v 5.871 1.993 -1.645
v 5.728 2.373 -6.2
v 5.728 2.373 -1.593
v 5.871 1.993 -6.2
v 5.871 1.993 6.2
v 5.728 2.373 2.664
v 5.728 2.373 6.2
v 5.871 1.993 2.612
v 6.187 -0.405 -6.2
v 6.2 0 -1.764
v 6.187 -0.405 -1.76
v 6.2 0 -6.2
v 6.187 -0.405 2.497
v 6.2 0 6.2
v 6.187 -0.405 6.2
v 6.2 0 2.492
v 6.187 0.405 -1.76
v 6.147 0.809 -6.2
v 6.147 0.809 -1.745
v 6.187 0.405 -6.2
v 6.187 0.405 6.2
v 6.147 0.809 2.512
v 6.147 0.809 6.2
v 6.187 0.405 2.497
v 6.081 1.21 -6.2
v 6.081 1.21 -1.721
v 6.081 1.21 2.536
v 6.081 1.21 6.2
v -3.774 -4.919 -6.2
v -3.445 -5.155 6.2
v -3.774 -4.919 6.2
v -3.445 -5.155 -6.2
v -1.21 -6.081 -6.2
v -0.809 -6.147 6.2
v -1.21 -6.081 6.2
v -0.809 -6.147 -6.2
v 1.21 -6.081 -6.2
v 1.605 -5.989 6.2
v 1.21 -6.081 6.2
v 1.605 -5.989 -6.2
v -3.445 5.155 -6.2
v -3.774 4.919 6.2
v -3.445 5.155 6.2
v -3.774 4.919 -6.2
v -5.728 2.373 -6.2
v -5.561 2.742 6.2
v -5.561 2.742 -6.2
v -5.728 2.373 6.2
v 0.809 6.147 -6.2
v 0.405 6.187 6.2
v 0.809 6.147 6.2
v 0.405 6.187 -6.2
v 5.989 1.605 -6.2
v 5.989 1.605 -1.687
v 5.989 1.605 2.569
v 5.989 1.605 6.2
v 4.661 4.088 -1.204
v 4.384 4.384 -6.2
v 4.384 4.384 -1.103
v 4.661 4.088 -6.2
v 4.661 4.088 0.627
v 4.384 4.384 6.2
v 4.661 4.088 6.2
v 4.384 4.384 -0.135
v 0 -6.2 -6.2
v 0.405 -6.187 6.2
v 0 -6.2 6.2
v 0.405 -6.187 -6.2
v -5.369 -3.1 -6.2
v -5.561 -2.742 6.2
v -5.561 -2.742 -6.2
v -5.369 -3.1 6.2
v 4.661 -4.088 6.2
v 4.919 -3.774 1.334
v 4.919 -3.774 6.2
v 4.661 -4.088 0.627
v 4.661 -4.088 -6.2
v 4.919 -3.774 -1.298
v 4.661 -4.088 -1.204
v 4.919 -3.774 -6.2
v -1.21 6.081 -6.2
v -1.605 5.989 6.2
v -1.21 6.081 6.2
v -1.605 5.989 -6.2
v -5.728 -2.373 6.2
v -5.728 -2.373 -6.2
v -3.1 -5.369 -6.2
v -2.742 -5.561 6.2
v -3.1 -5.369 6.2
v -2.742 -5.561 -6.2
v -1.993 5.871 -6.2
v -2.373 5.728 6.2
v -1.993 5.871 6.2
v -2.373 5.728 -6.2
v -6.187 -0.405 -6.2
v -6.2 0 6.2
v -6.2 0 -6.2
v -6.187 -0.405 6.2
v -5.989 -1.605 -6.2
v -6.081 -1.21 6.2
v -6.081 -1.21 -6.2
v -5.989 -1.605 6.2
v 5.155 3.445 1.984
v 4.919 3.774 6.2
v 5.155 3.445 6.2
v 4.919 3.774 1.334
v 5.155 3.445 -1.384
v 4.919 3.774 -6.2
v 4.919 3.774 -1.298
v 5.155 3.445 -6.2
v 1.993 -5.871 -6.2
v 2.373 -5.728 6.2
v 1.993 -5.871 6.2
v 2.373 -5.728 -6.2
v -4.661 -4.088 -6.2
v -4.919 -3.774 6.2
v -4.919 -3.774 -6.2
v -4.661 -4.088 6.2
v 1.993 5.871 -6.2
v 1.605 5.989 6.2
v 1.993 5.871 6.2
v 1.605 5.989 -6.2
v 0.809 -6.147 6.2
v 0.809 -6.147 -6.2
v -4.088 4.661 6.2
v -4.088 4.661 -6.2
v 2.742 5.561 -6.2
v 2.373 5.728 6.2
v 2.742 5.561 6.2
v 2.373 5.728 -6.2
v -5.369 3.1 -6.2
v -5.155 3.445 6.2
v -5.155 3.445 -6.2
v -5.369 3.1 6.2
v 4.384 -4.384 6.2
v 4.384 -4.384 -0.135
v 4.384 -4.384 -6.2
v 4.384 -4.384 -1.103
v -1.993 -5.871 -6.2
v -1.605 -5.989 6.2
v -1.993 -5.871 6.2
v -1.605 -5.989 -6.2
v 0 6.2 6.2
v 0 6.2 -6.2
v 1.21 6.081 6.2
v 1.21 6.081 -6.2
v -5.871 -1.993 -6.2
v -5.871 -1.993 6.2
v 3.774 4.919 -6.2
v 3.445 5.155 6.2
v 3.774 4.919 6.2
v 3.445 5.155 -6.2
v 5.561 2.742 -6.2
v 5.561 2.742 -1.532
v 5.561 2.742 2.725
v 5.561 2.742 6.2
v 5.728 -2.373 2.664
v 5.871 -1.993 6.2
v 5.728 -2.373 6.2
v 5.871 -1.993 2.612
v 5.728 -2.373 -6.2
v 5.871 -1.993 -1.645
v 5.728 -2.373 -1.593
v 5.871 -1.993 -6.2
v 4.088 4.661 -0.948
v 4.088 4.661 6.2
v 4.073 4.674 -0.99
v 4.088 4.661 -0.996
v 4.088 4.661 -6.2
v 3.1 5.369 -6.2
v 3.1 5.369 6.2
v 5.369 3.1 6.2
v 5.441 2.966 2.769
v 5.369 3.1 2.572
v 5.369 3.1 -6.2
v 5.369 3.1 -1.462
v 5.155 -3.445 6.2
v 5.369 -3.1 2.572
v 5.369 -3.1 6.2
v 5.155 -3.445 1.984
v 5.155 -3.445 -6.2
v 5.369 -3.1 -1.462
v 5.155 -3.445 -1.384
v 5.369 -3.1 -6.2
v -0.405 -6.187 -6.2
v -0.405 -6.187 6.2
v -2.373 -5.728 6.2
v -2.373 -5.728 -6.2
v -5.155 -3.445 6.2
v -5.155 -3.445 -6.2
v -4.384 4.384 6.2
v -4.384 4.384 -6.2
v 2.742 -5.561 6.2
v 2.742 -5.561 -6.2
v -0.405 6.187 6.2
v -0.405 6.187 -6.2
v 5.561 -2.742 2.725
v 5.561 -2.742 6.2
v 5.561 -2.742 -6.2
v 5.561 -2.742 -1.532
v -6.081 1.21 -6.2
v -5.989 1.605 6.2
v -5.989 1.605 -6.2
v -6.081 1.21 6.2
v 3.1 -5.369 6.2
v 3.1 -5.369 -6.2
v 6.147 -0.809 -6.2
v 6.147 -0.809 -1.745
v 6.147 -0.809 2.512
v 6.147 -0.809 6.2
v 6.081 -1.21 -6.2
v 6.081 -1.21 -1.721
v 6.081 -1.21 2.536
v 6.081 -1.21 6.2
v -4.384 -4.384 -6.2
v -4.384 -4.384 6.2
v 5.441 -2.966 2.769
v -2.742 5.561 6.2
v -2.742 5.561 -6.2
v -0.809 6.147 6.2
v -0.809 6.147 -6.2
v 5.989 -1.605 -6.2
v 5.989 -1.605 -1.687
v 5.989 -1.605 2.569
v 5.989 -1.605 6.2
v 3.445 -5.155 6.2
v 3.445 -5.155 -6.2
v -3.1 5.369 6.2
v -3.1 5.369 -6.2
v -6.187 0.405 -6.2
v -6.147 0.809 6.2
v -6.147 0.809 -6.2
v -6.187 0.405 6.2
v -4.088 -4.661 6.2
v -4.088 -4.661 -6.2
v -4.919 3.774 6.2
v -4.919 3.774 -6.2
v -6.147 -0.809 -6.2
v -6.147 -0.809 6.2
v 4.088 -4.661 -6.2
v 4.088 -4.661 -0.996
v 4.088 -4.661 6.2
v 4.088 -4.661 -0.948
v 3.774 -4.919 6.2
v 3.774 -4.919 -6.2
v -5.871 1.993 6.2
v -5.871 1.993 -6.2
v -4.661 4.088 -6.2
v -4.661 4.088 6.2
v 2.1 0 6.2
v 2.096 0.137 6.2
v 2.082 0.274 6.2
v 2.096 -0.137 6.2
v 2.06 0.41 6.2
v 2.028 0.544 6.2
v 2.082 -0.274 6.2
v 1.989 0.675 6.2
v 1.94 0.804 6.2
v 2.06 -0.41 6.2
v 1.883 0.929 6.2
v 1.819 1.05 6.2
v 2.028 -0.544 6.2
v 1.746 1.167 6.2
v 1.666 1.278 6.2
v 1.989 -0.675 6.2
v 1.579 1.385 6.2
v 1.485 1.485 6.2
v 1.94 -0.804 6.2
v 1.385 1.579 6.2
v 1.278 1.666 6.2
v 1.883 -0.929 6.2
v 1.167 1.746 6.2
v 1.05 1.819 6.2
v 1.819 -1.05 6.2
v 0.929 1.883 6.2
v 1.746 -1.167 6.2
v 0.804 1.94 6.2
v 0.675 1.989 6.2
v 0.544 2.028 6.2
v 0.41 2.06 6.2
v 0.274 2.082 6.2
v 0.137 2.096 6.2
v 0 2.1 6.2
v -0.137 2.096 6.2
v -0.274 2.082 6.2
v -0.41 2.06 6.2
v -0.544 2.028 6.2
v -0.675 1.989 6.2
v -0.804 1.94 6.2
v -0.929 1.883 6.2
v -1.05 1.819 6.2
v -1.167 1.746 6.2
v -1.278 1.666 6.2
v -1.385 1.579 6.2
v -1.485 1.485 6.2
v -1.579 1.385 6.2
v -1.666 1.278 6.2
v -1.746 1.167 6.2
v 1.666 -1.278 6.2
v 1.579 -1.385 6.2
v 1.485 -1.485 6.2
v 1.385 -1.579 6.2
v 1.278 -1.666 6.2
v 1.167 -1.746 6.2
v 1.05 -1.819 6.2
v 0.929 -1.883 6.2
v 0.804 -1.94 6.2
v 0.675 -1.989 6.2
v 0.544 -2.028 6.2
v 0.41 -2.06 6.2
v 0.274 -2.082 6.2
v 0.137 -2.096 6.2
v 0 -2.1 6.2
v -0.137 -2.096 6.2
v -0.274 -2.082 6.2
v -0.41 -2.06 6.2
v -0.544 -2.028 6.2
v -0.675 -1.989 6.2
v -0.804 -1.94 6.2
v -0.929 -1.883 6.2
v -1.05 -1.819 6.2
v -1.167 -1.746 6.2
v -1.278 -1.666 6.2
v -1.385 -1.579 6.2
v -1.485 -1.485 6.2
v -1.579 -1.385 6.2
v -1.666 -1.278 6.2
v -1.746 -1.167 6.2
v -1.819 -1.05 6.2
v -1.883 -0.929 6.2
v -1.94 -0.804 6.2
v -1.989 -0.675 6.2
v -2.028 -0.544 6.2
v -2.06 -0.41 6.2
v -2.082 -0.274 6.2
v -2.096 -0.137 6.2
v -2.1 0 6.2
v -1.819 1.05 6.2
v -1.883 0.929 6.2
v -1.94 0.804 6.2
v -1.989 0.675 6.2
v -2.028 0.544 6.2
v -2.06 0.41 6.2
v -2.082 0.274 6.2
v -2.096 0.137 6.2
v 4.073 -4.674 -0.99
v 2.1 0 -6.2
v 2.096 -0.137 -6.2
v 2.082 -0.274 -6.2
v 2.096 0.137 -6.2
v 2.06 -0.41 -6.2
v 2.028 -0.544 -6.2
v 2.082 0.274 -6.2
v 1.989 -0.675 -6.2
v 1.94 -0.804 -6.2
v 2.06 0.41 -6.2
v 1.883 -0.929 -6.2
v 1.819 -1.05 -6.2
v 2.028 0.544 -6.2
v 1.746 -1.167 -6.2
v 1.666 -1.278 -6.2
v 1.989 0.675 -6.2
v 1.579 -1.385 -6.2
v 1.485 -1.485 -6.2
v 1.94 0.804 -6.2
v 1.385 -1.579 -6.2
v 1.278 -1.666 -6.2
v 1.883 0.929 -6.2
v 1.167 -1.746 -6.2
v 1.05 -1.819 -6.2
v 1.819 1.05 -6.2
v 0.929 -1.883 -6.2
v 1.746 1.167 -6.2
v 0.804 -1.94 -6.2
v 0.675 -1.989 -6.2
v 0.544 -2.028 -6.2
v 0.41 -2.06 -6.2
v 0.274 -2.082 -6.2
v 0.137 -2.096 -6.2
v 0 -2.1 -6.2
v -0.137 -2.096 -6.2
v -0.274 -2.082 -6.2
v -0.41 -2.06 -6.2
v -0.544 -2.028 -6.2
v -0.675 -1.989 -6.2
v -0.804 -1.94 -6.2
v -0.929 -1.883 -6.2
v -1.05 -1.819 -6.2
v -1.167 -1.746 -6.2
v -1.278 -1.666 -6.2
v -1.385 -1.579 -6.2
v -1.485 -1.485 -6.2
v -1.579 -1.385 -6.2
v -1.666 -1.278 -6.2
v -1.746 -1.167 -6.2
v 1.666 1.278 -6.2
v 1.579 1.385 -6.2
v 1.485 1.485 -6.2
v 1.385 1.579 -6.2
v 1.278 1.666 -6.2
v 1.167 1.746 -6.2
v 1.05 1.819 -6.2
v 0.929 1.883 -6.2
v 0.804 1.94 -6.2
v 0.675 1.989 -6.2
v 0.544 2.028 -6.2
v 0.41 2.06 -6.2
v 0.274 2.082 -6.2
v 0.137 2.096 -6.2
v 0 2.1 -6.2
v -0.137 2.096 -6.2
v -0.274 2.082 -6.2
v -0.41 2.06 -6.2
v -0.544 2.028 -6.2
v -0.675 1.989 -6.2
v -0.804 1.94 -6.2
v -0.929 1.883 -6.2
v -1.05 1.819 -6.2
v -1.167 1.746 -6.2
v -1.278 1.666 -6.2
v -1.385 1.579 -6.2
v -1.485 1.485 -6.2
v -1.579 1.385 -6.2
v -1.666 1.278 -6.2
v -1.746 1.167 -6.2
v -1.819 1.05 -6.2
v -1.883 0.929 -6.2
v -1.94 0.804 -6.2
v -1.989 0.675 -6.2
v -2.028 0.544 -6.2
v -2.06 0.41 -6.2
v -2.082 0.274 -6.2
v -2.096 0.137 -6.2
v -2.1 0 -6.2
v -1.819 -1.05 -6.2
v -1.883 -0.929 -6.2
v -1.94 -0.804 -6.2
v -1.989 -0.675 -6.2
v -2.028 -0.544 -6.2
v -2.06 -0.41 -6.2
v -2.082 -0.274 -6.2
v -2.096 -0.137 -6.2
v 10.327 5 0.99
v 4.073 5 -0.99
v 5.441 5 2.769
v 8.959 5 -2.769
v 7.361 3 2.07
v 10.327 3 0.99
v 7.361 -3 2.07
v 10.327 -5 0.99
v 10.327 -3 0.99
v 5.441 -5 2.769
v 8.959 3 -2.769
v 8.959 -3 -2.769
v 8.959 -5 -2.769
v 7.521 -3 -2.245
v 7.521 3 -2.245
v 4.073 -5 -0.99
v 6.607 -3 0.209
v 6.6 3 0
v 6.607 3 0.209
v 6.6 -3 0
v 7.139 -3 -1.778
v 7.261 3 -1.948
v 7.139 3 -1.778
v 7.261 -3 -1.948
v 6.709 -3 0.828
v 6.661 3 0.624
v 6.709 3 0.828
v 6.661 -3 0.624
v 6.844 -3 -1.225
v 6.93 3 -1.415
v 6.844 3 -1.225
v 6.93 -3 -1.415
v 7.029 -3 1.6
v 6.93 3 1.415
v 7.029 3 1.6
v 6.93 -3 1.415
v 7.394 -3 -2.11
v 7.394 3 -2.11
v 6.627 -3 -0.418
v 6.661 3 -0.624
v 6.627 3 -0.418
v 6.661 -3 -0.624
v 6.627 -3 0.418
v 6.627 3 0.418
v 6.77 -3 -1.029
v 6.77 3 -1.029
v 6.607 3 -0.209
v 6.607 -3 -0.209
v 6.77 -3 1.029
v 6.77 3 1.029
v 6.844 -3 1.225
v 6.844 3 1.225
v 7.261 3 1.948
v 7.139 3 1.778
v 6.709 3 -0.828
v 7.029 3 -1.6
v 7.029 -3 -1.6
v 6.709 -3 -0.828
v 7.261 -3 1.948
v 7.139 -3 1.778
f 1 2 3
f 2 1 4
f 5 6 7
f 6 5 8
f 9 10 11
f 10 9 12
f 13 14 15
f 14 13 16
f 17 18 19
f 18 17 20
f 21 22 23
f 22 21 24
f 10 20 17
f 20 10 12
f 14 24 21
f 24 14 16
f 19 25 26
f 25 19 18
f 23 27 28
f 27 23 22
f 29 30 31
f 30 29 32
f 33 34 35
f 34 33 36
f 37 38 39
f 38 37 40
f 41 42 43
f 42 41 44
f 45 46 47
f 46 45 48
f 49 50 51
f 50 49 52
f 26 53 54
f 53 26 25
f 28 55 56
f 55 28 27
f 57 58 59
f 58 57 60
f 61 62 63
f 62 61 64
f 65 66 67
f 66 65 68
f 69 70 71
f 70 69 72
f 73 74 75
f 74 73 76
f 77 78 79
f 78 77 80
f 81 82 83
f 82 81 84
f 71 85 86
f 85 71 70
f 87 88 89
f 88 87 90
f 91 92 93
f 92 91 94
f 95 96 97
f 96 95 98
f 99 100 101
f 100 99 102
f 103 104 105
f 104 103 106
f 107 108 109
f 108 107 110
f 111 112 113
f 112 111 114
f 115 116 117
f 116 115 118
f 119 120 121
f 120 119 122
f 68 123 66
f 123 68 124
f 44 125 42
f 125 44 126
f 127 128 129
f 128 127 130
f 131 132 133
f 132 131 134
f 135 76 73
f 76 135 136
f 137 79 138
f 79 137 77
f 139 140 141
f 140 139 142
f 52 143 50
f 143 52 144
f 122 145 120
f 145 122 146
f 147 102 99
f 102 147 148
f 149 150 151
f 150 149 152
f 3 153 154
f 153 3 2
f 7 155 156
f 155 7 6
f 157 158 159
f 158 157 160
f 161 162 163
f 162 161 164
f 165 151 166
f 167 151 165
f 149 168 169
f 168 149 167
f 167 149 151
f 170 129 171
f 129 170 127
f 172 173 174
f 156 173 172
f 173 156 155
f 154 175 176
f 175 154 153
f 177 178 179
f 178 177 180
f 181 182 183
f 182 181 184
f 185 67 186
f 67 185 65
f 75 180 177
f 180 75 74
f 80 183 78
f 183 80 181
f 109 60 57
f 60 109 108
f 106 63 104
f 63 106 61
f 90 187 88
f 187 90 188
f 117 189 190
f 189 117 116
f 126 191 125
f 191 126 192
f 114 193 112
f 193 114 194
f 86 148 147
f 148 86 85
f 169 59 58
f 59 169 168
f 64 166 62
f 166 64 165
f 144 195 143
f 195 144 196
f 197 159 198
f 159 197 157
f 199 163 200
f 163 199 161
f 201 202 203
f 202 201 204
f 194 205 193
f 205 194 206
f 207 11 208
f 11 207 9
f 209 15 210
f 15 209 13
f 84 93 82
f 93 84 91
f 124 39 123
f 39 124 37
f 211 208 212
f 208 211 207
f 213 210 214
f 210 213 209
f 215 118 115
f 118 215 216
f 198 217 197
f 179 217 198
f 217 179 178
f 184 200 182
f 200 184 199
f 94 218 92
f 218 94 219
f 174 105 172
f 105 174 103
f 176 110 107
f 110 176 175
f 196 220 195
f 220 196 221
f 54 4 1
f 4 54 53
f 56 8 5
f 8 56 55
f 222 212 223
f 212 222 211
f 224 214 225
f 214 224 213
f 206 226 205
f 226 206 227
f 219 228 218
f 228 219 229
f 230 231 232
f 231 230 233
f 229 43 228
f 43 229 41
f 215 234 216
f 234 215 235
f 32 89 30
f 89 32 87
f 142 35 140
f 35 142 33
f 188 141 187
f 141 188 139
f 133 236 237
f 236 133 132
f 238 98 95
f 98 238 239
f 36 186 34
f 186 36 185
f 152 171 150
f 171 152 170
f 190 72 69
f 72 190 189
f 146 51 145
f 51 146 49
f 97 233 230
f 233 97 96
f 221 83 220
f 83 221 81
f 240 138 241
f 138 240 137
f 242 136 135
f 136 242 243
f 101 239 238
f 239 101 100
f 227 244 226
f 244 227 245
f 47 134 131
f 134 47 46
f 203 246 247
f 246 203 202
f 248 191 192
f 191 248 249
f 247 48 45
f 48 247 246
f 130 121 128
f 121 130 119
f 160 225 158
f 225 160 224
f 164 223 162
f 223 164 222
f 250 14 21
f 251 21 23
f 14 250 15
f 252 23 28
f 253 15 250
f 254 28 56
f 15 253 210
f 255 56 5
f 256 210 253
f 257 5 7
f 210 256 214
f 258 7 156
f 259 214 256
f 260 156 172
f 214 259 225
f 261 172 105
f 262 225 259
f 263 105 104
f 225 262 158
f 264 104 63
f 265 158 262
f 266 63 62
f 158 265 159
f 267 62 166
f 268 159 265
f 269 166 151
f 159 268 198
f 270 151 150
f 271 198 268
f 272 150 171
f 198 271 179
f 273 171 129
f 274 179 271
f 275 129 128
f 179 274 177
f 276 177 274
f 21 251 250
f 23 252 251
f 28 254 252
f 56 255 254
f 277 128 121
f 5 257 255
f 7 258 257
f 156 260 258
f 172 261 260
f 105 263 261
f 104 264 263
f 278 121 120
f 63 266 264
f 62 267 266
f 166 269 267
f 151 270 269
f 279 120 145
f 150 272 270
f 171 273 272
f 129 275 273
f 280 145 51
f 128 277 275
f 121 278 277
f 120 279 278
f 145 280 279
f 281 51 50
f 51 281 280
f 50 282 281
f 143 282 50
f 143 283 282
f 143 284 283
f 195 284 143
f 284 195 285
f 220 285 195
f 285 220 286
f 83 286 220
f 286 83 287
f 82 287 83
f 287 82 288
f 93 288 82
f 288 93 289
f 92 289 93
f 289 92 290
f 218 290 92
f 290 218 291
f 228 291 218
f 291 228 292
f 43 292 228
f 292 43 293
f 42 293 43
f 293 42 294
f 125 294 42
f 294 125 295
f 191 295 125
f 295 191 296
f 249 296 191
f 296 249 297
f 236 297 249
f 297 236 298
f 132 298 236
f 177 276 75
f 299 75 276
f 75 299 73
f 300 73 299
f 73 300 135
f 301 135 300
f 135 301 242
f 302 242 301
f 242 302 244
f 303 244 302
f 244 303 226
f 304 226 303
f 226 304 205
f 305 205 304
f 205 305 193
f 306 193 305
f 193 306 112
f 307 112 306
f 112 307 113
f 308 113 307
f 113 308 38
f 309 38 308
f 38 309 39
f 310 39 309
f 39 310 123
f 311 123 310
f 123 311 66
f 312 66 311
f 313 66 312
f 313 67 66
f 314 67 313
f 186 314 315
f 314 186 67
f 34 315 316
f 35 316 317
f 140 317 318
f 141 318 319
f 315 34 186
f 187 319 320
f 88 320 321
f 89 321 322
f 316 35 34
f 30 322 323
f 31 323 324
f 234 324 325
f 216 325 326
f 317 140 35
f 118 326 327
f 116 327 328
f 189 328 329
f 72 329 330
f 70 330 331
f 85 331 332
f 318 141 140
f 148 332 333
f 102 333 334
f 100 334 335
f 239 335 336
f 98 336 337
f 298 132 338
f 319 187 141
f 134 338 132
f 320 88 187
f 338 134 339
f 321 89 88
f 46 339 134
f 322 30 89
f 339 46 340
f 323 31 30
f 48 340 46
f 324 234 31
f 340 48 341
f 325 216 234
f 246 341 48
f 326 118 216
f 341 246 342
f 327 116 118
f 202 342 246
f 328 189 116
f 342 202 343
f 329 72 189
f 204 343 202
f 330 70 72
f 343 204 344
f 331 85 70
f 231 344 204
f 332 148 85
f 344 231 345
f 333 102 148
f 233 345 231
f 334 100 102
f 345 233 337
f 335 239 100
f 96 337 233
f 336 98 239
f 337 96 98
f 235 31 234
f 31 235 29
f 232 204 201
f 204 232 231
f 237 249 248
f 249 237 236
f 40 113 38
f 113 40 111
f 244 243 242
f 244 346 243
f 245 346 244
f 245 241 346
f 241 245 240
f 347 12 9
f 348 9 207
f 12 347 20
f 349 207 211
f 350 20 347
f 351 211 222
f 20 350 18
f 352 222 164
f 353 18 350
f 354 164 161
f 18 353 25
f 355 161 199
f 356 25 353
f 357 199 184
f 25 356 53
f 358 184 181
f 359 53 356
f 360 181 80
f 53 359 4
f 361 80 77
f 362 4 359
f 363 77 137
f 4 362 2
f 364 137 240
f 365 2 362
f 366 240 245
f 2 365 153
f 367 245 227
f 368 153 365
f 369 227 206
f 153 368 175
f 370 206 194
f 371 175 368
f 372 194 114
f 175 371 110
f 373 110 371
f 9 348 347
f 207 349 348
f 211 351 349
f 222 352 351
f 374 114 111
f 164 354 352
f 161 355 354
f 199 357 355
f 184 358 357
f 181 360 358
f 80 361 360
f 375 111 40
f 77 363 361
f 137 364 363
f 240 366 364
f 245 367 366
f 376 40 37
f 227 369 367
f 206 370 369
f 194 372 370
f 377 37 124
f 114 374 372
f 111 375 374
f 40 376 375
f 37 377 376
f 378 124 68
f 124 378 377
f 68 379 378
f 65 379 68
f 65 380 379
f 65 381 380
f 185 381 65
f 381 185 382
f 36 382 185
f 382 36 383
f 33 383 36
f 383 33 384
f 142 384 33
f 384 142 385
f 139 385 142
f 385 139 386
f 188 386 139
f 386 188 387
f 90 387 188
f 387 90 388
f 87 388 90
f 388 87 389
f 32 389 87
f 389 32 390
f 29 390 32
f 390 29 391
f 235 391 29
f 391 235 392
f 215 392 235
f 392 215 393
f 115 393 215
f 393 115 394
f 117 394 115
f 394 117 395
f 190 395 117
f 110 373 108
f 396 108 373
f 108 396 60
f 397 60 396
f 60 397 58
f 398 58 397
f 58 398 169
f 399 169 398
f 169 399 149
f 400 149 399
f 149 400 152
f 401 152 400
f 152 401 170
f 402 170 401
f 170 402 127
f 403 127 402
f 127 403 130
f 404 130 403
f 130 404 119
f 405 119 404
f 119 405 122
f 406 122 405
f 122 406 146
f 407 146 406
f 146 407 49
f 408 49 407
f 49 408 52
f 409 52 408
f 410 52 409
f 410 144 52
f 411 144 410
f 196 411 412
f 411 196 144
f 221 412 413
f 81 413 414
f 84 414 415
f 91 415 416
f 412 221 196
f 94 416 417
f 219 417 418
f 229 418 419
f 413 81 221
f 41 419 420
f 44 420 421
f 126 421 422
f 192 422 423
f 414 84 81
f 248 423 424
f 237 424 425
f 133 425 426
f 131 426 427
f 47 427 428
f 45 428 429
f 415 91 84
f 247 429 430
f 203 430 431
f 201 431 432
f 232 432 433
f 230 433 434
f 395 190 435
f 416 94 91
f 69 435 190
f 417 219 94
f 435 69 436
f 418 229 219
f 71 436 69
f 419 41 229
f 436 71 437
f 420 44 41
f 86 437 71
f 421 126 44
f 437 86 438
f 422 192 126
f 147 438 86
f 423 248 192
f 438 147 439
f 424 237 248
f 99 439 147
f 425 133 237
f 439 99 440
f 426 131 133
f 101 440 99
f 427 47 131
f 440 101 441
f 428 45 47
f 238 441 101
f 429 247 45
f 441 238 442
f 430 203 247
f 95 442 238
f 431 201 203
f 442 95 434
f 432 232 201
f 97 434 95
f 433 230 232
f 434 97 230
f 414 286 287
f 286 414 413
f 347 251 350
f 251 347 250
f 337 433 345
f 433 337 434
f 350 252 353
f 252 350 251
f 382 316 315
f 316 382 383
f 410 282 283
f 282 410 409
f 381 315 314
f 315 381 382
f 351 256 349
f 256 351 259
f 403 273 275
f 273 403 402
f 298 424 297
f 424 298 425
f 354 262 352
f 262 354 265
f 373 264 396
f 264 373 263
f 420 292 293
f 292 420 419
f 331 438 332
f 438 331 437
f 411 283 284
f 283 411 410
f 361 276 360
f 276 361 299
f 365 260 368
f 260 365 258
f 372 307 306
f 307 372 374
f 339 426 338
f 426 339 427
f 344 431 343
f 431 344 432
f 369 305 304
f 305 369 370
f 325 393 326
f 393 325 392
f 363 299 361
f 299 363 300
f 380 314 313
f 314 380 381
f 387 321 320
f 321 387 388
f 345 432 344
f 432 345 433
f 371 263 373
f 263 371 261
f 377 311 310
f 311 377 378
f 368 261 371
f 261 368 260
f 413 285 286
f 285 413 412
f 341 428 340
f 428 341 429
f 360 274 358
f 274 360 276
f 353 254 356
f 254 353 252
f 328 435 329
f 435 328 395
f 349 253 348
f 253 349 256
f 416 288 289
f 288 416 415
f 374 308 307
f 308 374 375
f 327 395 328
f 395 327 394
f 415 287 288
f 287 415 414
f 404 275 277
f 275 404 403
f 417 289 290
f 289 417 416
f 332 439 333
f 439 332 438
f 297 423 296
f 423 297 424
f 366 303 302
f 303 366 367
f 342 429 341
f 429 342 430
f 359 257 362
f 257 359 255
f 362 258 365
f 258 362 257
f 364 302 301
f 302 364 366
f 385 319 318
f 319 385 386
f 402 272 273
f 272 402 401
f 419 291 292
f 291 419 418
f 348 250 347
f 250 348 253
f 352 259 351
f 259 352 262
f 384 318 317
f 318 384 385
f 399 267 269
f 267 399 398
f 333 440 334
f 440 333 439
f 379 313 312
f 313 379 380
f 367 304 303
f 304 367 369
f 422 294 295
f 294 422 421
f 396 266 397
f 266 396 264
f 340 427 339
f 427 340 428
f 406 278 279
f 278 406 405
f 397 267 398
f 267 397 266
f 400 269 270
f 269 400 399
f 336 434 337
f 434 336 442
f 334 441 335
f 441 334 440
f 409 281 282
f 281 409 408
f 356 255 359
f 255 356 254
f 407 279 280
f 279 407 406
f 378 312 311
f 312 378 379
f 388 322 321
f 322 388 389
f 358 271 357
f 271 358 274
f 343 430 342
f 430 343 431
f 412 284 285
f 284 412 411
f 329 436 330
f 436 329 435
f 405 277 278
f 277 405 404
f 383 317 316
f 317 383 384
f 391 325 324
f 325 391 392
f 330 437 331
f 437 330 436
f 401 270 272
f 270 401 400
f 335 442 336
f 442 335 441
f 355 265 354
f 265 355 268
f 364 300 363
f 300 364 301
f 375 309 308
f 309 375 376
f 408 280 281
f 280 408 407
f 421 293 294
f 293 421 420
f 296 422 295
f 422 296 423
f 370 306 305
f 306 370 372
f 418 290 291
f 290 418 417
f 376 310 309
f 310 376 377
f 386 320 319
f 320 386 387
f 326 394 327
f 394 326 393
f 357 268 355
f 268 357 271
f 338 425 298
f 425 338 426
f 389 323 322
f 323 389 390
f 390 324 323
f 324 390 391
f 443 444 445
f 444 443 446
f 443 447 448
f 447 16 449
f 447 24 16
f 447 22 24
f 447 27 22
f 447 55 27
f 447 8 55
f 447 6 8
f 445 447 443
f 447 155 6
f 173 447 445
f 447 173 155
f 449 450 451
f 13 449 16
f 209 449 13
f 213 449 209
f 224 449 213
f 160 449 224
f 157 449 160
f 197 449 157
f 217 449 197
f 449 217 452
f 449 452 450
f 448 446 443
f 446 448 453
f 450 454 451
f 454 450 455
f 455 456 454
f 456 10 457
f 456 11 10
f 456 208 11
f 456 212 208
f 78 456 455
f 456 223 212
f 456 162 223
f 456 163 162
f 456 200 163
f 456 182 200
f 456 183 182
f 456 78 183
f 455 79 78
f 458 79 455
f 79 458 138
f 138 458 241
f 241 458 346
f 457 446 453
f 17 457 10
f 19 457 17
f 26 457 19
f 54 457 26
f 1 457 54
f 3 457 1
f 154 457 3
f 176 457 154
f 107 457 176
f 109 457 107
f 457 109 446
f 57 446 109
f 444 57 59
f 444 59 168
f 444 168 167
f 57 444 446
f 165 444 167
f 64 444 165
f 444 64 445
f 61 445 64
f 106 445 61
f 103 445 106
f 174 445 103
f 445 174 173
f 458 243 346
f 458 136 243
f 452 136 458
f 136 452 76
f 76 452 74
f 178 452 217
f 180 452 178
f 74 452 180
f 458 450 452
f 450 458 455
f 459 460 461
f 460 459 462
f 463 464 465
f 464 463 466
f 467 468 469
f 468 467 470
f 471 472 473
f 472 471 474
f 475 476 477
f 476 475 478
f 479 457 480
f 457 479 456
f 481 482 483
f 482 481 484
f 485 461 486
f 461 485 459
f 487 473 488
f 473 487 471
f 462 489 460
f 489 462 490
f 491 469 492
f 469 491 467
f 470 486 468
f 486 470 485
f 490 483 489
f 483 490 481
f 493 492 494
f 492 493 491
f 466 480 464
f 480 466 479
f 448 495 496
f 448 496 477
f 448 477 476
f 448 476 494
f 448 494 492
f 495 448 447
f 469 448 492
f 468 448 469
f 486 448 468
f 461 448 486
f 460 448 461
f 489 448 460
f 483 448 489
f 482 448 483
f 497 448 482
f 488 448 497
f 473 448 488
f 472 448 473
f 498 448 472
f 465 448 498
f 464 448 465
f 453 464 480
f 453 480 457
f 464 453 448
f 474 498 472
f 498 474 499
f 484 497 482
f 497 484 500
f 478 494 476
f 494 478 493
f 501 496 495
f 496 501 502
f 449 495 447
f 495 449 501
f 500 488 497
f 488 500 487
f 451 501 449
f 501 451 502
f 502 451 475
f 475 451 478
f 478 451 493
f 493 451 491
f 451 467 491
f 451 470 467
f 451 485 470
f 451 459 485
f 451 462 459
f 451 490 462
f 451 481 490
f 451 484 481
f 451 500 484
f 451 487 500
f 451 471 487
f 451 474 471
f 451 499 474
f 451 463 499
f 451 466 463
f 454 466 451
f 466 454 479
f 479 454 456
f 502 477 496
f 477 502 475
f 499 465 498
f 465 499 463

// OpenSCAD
$fn=96;

bbox_x = 19.6;
bbox_y = 12.4;
bbox_z = 12.4;

lug_d = 12.4;
lug_r = lug_d/2;
lug_h = 12.4;

hole_d = 4.2;

arm_th = 4.0;
arm_w  = 8.0;

pad_len = 5.2;
pad_w   = 10.0;
pad_th  = 4.0;

arm_start_x = lug_r - 0.2;
arm_end_x   = bbox_x/2 - pad_len;

notch_r = 3.2;
notch_depth = 6.0;
notch_center_x = arm_start_x + 3.8;

pad_angle = 20;

module lug() {
    difference() {
        cylinder(h=lug_h, r=lug_r, center=true);
        cylinder(h=lug_h+0.6, r=hole_d/2, center=true);
    }
}

module arm_body() {
    translate([(arm_start_x + arm_end_x)/2, 0, 0])
        cube([arm_end_x - arm_start_x, arm_w, arm_th], center=true);
}

module end_pad() {
    translate([bbox_x/2 - pad_len/2, 0, 0])
        rotate([0, pad_angle, 0])
            cube([pad_len, pad_w, pad_th], center=true);
}

module u_notch() {
    translate([notch_center_x, 0, 0])
        rotate([90, 0, 0])
            cylinder(h=notch_depth, r=notch_r, center=true);
}

difference() {
    union() {
        lug();
        arm_body();
        end_pad();
    }
    translate([0, 0, 0])
        u_notch();
}
